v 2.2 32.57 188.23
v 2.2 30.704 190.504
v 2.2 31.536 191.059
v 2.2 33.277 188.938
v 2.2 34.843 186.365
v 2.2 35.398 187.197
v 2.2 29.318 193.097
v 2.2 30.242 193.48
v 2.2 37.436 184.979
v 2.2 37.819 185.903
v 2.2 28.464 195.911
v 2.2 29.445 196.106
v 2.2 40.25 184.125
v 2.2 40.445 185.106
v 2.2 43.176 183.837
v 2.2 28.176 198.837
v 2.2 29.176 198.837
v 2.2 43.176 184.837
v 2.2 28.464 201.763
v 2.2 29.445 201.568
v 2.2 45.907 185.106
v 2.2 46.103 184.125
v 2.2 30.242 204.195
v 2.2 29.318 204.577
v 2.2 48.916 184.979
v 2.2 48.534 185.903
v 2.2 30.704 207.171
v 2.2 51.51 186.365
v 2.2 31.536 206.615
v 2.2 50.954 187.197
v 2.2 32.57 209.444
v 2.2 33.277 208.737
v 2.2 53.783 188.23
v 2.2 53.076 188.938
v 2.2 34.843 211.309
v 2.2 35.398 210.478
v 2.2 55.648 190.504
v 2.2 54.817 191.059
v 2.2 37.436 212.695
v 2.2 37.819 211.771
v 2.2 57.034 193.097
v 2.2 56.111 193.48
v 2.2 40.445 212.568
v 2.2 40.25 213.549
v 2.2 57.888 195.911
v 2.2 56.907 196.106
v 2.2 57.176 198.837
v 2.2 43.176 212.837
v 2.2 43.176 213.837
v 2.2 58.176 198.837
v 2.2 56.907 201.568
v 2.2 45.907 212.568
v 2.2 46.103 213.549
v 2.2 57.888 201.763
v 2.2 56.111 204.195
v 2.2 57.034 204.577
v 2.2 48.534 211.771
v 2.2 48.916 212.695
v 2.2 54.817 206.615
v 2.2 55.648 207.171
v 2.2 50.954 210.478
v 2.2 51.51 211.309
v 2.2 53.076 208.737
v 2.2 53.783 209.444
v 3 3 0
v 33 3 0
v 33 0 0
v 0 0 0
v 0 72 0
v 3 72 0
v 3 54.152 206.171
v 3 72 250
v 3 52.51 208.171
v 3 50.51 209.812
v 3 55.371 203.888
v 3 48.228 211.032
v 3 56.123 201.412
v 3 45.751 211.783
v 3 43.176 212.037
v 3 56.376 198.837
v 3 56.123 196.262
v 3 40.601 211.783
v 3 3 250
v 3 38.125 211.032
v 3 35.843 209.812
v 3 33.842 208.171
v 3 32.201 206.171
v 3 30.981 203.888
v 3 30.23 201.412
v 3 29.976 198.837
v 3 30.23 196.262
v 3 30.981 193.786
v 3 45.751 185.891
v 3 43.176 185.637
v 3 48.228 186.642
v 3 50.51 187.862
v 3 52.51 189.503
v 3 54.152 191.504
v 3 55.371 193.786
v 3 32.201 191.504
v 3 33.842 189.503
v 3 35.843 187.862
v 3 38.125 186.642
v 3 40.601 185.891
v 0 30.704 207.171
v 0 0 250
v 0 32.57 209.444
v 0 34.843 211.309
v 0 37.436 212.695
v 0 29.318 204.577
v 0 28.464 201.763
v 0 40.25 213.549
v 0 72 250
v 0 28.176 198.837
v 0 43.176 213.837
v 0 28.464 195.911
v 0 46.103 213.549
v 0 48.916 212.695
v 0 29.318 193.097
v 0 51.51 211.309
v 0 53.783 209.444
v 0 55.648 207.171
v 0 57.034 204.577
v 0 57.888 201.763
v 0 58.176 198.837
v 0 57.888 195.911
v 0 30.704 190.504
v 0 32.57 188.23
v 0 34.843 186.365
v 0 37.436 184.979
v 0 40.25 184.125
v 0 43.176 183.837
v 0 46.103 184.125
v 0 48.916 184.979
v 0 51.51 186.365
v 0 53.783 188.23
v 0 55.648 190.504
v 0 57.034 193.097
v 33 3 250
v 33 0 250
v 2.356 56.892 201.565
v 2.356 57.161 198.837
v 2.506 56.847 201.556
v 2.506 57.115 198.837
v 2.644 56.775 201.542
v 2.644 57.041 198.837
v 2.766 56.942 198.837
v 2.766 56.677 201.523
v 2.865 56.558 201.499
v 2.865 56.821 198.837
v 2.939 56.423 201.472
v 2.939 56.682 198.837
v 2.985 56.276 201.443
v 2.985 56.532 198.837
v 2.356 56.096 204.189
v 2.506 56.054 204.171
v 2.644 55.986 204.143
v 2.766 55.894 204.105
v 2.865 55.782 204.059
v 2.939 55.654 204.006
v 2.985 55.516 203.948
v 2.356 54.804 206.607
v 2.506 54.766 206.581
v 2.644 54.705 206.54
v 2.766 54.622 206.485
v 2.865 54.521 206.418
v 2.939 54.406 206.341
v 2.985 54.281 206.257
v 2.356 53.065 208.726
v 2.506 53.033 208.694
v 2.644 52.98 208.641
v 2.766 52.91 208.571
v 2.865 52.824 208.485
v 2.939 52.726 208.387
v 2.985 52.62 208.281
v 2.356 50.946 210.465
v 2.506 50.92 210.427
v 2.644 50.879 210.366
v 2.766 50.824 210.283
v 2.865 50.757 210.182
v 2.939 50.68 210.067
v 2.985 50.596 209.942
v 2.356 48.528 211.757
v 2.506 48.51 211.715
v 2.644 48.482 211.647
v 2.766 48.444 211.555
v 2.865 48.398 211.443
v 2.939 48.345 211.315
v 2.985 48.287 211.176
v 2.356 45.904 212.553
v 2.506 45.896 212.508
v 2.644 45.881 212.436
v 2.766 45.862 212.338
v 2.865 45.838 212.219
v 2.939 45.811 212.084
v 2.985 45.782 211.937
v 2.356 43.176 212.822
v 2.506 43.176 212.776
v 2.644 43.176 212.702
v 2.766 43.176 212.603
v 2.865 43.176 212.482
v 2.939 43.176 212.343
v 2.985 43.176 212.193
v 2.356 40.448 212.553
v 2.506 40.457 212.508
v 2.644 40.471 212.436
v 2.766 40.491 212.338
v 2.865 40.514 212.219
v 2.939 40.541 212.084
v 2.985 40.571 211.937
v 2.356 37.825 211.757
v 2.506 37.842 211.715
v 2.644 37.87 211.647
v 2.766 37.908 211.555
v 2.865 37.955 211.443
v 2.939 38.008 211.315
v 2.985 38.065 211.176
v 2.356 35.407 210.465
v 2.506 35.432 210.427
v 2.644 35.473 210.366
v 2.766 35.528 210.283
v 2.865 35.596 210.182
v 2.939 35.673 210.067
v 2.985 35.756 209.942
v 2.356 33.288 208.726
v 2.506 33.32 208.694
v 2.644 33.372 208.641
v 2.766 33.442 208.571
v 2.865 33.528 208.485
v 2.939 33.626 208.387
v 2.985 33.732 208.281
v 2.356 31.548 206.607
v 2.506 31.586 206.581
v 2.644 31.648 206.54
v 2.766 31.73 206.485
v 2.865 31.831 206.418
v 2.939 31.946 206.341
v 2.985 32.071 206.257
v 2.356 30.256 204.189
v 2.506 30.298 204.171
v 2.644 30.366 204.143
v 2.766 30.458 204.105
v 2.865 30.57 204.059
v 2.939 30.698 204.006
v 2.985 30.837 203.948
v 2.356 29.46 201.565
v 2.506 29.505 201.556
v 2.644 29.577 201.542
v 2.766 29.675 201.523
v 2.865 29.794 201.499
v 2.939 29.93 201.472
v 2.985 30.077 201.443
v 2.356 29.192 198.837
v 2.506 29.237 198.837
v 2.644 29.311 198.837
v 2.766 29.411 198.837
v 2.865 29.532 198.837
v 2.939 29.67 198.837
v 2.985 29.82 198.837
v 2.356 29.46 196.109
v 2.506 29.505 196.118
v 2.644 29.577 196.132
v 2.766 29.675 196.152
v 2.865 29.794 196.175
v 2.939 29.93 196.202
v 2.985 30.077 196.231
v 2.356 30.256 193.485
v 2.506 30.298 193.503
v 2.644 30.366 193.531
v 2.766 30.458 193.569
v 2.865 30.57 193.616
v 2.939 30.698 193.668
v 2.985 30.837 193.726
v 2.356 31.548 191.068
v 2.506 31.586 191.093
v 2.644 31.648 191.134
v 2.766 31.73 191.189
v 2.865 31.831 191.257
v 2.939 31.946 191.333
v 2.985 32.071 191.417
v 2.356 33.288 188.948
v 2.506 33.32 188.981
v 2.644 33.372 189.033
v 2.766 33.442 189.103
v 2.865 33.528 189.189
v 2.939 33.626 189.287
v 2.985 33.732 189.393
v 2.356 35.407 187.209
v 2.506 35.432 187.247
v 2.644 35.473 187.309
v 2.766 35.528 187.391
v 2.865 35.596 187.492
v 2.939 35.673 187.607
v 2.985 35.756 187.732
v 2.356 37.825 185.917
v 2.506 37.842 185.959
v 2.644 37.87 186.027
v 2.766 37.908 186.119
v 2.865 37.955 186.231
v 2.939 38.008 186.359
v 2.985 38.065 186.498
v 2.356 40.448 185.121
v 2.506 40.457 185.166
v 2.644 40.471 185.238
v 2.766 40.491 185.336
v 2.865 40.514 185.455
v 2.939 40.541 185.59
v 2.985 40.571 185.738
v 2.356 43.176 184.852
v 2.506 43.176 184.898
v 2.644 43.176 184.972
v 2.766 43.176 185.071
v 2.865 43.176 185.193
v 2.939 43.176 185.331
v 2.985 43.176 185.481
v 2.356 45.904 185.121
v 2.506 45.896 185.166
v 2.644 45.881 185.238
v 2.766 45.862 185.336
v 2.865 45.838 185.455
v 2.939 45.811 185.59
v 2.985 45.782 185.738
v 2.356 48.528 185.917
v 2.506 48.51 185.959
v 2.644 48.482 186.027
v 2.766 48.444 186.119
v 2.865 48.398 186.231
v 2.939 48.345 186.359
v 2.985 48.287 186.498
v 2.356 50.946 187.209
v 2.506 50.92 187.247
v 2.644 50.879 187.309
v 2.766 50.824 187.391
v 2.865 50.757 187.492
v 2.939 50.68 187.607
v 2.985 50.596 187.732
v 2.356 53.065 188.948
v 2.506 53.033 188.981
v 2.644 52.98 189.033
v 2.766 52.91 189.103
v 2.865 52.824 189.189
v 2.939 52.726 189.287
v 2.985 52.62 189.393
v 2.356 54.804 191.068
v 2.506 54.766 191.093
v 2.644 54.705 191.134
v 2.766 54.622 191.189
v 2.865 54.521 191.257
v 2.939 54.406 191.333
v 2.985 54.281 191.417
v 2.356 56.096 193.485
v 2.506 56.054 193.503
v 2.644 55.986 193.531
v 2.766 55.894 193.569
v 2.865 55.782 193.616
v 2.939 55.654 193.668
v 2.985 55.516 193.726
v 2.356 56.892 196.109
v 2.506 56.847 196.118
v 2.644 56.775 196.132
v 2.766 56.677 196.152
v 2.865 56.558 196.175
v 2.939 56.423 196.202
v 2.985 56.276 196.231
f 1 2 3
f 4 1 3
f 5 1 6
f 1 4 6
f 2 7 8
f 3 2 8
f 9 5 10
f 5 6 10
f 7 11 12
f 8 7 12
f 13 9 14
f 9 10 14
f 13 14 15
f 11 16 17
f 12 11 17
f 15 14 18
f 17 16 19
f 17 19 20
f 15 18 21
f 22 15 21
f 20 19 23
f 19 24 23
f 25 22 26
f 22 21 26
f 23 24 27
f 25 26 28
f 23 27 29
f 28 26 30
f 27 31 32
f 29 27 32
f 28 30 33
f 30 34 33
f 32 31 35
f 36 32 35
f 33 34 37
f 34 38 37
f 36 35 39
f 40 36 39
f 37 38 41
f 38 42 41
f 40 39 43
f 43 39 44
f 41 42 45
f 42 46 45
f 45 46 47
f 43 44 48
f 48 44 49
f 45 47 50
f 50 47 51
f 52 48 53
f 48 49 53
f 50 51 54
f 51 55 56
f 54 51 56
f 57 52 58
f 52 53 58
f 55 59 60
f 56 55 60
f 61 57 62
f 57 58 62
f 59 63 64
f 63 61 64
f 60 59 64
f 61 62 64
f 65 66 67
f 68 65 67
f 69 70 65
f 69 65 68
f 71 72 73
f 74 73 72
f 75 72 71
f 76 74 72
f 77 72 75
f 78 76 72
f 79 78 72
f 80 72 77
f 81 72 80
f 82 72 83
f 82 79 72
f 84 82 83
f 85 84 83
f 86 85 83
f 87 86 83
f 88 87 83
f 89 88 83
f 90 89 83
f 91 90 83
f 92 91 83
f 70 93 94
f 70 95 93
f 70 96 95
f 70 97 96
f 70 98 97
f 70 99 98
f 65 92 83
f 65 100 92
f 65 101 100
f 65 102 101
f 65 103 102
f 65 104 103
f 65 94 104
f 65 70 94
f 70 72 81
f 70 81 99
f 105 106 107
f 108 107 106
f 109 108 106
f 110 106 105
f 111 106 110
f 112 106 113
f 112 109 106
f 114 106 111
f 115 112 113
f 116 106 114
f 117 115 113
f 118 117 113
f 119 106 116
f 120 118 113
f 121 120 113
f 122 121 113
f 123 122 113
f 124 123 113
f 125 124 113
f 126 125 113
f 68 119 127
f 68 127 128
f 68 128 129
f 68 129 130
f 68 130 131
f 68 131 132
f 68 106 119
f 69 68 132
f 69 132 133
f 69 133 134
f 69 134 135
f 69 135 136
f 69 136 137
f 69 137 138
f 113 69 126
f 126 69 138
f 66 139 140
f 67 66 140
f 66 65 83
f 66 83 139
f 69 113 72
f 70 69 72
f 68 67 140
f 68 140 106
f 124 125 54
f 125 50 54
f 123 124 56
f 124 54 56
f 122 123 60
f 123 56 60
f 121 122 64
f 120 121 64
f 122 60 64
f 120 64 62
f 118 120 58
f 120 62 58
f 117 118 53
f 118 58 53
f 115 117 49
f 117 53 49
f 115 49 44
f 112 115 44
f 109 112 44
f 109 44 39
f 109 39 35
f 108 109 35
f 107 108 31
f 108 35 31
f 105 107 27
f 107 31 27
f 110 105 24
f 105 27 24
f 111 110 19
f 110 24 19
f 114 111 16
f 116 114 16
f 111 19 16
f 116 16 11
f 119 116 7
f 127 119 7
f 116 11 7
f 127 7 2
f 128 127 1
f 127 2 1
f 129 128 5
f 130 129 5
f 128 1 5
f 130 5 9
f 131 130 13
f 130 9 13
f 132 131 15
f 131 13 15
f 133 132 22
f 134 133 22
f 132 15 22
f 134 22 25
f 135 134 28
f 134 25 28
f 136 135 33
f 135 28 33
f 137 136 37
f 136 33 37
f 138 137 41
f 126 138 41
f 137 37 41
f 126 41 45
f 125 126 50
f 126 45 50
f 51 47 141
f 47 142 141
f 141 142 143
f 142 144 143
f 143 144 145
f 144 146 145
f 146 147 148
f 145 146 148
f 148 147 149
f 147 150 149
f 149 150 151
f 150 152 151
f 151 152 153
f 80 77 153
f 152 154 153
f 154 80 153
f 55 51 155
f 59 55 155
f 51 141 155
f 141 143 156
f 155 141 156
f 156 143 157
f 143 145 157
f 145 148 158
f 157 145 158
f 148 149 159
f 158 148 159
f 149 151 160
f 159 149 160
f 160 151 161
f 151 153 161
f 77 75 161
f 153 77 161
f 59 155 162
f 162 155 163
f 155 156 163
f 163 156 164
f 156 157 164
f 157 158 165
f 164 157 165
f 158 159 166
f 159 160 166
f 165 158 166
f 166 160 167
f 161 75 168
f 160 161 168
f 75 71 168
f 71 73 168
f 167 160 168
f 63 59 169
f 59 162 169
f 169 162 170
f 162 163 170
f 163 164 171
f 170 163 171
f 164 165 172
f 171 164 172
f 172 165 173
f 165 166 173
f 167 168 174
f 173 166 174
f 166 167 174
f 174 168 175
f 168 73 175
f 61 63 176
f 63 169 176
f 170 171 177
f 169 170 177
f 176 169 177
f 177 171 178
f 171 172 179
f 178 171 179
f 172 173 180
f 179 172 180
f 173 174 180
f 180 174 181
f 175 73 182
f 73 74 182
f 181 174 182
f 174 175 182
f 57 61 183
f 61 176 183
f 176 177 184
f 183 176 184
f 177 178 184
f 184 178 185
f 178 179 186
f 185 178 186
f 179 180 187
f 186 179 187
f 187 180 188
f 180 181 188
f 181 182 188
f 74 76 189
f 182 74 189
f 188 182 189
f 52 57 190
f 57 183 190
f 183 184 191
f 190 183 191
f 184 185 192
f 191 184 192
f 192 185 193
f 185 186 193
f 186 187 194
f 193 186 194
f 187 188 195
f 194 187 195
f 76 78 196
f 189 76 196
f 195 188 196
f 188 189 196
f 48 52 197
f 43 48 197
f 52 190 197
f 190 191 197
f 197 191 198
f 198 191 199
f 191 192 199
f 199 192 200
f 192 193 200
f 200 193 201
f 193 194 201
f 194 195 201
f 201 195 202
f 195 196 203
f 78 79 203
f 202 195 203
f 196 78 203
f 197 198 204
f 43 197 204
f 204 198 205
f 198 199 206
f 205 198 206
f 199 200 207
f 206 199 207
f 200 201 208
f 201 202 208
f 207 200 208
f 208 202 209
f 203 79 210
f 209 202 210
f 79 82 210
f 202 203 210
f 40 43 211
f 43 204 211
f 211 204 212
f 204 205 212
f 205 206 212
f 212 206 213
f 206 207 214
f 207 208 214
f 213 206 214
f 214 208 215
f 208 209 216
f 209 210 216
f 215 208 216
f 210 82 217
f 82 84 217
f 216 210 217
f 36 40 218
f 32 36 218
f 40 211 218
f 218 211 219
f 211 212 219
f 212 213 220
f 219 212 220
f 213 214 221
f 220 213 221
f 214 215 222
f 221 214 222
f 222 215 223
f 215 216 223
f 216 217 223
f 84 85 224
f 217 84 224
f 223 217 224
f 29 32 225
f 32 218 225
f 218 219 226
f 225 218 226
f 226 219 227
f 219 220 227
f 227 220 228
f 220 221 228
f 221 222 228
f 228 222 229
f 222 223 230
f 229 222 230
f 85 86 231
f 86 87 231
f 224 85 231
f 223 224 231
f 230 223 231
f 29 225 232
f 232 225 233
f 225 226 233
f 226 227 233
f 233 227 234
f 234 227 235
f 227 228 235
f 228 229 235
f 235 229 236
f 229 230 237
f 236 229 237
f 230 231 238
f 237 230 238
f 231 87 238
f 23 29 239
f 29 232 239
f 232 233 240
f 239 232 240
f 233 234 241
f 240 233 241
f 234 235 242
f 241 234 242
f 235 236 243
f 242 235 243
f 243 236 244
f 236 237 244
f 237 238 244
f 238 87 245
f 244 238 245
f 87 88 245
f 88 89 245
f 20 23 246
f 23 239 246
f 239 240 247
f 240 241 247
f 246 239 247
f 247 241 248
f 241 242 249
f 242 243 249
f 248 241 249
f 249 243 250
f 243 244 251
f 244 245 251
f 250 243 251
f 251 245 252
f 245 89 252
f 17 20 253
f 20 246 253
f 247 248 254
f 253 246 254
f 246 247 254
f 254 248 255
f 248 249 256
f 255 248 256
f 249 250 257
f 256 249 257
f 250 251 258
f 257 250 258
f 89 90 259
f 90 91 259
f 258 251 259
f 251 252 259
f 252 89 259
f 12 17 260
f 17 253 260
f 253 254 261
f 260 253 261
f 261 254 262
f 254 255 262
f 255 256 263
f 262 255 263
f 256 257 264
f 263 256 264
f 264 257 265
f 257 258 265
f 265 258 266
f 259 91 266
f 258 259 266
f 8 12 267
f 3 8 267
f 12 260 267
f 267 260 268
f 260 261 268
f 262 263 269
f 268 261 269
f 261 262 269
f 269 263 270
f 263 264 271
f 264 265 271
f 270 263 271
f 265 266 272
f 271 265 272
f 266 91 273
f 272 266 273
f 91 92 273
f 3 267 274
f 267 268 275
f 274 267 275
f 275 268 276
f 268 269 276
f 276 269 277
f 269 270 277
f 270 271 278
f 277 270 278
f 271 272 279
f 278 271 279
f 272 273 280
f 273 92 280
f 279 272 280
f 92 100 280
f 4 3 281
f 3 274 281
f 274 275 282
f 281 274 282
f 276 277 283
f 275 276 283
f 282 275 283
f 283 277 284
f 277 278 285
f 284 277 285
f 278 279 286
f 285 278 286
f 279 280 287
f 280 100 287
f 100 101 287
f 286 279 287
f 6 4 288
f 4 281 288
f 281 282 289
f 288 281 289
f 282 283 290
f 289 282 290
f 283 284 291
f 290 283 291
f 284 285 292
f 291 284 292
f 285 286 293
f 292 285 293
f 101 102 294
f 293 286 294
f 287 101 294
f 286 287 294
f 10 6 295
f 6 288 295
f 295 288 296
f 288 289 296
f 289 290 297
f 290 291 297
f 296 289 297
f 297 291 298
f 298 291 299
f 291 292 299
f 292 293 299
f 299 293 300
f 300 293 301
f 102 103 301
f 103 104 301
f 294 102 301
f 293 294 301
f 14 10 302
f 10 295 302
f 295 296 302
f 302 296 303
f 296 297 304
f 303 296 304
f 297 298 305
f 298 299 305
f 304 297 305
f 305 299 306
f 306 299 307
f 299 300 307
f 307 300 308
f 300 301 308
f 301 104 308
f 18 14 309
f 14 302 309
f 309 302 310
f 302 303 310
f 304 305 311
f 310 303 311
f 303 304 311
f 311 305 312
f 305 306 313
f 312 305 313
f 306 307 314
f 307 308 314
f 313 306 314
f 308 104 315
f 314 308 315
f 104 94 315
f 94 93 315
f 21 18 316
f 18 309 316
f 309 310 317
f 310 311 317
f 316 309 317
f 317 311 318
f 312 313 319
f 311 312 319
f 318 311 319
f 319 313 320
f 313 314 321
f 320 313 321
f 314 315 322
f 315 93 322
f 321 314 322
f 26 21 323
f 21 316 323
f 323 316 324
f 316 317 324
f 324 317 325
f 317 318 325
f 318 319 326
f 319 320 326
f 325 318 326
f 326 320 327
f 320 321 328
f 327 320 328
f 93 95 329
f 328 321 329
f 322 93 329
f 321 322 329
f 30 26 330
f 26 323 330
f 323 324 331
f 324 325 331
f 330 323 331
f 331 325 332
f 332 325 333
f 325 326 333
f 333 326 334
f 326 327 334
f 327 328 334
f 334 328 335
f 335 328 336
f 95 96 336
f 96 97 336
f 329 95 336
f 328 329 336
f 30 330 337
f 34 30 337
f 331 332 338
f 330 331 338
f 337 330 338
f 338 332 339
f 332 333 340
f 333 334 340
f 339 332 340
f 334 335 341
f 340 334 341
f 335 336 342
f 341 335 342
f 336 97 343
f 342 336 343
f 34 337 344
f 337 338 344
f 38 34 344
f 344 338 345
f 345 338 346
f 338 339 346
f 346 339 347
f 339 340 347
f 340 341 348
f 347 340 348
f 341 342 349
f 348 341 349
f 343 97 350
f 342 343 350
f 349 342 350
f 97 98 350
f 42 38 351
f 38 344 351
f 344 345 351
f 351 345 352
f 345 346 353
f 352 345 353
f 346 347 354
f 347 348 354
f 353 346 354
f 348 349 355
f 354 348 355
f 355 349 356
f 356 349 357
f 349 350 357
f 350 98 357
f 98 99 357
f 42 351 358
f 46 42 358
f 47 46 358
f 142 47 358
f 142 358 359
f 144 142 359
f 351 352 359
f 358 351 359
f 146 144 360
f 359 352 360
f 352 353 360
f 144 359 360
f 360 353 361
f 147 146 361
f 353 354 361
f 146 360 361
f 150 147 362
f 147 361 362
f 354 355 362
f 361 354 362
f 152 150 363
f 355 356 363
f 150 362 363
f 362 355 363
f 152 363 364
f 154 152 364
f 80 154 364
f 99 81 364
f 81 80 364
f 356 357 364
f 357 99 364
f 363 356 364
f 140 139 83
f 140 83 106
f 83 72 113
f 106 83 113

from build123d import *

# Parameters (mm, degrees)
BOSS_EXTRUDE1_DEPTH = 250


# Read off the part's stored shape, not the designer's step: Cavity1
with BuildPart() as part:
    # Sketch1 → Boss-Extrude1 (new body)
    with BuildSketch(Plane.XY):
        Polygon((0, 72), (3, 72), (3, 3), (33, 3), (33, 0), (0, 0), align=None)
    extrude(amount=BOSS_EXTRUDE1_DEPTH)

    # Cavity1 outline → Cavity1 (revolve, cut)
    with BuildSketch(Plane(origin=(0, 43.176202168, 198.837075549), x_dir=(0, 1, 0), z_dir=(0, 0, -1))):
        with BuildLine():
            Line((15, 0), (15, 2.2))
            Line((15, 2.2), (14, 2.2))
            ThreePointArc((14, 2.2), (13.765685425, 2.765685425), (13.2, 3))
            Line((13.2, 3), (0, 3))
            Line((0, 3), (0, 0))
            Line((0, 0), (15, 0))
        make_face()
    revolve(axis=Axis((0, 43.176202168, 198.837075549), (1, 0, 0)), mode=Mode.SUBTRACT)


solid = part.part
